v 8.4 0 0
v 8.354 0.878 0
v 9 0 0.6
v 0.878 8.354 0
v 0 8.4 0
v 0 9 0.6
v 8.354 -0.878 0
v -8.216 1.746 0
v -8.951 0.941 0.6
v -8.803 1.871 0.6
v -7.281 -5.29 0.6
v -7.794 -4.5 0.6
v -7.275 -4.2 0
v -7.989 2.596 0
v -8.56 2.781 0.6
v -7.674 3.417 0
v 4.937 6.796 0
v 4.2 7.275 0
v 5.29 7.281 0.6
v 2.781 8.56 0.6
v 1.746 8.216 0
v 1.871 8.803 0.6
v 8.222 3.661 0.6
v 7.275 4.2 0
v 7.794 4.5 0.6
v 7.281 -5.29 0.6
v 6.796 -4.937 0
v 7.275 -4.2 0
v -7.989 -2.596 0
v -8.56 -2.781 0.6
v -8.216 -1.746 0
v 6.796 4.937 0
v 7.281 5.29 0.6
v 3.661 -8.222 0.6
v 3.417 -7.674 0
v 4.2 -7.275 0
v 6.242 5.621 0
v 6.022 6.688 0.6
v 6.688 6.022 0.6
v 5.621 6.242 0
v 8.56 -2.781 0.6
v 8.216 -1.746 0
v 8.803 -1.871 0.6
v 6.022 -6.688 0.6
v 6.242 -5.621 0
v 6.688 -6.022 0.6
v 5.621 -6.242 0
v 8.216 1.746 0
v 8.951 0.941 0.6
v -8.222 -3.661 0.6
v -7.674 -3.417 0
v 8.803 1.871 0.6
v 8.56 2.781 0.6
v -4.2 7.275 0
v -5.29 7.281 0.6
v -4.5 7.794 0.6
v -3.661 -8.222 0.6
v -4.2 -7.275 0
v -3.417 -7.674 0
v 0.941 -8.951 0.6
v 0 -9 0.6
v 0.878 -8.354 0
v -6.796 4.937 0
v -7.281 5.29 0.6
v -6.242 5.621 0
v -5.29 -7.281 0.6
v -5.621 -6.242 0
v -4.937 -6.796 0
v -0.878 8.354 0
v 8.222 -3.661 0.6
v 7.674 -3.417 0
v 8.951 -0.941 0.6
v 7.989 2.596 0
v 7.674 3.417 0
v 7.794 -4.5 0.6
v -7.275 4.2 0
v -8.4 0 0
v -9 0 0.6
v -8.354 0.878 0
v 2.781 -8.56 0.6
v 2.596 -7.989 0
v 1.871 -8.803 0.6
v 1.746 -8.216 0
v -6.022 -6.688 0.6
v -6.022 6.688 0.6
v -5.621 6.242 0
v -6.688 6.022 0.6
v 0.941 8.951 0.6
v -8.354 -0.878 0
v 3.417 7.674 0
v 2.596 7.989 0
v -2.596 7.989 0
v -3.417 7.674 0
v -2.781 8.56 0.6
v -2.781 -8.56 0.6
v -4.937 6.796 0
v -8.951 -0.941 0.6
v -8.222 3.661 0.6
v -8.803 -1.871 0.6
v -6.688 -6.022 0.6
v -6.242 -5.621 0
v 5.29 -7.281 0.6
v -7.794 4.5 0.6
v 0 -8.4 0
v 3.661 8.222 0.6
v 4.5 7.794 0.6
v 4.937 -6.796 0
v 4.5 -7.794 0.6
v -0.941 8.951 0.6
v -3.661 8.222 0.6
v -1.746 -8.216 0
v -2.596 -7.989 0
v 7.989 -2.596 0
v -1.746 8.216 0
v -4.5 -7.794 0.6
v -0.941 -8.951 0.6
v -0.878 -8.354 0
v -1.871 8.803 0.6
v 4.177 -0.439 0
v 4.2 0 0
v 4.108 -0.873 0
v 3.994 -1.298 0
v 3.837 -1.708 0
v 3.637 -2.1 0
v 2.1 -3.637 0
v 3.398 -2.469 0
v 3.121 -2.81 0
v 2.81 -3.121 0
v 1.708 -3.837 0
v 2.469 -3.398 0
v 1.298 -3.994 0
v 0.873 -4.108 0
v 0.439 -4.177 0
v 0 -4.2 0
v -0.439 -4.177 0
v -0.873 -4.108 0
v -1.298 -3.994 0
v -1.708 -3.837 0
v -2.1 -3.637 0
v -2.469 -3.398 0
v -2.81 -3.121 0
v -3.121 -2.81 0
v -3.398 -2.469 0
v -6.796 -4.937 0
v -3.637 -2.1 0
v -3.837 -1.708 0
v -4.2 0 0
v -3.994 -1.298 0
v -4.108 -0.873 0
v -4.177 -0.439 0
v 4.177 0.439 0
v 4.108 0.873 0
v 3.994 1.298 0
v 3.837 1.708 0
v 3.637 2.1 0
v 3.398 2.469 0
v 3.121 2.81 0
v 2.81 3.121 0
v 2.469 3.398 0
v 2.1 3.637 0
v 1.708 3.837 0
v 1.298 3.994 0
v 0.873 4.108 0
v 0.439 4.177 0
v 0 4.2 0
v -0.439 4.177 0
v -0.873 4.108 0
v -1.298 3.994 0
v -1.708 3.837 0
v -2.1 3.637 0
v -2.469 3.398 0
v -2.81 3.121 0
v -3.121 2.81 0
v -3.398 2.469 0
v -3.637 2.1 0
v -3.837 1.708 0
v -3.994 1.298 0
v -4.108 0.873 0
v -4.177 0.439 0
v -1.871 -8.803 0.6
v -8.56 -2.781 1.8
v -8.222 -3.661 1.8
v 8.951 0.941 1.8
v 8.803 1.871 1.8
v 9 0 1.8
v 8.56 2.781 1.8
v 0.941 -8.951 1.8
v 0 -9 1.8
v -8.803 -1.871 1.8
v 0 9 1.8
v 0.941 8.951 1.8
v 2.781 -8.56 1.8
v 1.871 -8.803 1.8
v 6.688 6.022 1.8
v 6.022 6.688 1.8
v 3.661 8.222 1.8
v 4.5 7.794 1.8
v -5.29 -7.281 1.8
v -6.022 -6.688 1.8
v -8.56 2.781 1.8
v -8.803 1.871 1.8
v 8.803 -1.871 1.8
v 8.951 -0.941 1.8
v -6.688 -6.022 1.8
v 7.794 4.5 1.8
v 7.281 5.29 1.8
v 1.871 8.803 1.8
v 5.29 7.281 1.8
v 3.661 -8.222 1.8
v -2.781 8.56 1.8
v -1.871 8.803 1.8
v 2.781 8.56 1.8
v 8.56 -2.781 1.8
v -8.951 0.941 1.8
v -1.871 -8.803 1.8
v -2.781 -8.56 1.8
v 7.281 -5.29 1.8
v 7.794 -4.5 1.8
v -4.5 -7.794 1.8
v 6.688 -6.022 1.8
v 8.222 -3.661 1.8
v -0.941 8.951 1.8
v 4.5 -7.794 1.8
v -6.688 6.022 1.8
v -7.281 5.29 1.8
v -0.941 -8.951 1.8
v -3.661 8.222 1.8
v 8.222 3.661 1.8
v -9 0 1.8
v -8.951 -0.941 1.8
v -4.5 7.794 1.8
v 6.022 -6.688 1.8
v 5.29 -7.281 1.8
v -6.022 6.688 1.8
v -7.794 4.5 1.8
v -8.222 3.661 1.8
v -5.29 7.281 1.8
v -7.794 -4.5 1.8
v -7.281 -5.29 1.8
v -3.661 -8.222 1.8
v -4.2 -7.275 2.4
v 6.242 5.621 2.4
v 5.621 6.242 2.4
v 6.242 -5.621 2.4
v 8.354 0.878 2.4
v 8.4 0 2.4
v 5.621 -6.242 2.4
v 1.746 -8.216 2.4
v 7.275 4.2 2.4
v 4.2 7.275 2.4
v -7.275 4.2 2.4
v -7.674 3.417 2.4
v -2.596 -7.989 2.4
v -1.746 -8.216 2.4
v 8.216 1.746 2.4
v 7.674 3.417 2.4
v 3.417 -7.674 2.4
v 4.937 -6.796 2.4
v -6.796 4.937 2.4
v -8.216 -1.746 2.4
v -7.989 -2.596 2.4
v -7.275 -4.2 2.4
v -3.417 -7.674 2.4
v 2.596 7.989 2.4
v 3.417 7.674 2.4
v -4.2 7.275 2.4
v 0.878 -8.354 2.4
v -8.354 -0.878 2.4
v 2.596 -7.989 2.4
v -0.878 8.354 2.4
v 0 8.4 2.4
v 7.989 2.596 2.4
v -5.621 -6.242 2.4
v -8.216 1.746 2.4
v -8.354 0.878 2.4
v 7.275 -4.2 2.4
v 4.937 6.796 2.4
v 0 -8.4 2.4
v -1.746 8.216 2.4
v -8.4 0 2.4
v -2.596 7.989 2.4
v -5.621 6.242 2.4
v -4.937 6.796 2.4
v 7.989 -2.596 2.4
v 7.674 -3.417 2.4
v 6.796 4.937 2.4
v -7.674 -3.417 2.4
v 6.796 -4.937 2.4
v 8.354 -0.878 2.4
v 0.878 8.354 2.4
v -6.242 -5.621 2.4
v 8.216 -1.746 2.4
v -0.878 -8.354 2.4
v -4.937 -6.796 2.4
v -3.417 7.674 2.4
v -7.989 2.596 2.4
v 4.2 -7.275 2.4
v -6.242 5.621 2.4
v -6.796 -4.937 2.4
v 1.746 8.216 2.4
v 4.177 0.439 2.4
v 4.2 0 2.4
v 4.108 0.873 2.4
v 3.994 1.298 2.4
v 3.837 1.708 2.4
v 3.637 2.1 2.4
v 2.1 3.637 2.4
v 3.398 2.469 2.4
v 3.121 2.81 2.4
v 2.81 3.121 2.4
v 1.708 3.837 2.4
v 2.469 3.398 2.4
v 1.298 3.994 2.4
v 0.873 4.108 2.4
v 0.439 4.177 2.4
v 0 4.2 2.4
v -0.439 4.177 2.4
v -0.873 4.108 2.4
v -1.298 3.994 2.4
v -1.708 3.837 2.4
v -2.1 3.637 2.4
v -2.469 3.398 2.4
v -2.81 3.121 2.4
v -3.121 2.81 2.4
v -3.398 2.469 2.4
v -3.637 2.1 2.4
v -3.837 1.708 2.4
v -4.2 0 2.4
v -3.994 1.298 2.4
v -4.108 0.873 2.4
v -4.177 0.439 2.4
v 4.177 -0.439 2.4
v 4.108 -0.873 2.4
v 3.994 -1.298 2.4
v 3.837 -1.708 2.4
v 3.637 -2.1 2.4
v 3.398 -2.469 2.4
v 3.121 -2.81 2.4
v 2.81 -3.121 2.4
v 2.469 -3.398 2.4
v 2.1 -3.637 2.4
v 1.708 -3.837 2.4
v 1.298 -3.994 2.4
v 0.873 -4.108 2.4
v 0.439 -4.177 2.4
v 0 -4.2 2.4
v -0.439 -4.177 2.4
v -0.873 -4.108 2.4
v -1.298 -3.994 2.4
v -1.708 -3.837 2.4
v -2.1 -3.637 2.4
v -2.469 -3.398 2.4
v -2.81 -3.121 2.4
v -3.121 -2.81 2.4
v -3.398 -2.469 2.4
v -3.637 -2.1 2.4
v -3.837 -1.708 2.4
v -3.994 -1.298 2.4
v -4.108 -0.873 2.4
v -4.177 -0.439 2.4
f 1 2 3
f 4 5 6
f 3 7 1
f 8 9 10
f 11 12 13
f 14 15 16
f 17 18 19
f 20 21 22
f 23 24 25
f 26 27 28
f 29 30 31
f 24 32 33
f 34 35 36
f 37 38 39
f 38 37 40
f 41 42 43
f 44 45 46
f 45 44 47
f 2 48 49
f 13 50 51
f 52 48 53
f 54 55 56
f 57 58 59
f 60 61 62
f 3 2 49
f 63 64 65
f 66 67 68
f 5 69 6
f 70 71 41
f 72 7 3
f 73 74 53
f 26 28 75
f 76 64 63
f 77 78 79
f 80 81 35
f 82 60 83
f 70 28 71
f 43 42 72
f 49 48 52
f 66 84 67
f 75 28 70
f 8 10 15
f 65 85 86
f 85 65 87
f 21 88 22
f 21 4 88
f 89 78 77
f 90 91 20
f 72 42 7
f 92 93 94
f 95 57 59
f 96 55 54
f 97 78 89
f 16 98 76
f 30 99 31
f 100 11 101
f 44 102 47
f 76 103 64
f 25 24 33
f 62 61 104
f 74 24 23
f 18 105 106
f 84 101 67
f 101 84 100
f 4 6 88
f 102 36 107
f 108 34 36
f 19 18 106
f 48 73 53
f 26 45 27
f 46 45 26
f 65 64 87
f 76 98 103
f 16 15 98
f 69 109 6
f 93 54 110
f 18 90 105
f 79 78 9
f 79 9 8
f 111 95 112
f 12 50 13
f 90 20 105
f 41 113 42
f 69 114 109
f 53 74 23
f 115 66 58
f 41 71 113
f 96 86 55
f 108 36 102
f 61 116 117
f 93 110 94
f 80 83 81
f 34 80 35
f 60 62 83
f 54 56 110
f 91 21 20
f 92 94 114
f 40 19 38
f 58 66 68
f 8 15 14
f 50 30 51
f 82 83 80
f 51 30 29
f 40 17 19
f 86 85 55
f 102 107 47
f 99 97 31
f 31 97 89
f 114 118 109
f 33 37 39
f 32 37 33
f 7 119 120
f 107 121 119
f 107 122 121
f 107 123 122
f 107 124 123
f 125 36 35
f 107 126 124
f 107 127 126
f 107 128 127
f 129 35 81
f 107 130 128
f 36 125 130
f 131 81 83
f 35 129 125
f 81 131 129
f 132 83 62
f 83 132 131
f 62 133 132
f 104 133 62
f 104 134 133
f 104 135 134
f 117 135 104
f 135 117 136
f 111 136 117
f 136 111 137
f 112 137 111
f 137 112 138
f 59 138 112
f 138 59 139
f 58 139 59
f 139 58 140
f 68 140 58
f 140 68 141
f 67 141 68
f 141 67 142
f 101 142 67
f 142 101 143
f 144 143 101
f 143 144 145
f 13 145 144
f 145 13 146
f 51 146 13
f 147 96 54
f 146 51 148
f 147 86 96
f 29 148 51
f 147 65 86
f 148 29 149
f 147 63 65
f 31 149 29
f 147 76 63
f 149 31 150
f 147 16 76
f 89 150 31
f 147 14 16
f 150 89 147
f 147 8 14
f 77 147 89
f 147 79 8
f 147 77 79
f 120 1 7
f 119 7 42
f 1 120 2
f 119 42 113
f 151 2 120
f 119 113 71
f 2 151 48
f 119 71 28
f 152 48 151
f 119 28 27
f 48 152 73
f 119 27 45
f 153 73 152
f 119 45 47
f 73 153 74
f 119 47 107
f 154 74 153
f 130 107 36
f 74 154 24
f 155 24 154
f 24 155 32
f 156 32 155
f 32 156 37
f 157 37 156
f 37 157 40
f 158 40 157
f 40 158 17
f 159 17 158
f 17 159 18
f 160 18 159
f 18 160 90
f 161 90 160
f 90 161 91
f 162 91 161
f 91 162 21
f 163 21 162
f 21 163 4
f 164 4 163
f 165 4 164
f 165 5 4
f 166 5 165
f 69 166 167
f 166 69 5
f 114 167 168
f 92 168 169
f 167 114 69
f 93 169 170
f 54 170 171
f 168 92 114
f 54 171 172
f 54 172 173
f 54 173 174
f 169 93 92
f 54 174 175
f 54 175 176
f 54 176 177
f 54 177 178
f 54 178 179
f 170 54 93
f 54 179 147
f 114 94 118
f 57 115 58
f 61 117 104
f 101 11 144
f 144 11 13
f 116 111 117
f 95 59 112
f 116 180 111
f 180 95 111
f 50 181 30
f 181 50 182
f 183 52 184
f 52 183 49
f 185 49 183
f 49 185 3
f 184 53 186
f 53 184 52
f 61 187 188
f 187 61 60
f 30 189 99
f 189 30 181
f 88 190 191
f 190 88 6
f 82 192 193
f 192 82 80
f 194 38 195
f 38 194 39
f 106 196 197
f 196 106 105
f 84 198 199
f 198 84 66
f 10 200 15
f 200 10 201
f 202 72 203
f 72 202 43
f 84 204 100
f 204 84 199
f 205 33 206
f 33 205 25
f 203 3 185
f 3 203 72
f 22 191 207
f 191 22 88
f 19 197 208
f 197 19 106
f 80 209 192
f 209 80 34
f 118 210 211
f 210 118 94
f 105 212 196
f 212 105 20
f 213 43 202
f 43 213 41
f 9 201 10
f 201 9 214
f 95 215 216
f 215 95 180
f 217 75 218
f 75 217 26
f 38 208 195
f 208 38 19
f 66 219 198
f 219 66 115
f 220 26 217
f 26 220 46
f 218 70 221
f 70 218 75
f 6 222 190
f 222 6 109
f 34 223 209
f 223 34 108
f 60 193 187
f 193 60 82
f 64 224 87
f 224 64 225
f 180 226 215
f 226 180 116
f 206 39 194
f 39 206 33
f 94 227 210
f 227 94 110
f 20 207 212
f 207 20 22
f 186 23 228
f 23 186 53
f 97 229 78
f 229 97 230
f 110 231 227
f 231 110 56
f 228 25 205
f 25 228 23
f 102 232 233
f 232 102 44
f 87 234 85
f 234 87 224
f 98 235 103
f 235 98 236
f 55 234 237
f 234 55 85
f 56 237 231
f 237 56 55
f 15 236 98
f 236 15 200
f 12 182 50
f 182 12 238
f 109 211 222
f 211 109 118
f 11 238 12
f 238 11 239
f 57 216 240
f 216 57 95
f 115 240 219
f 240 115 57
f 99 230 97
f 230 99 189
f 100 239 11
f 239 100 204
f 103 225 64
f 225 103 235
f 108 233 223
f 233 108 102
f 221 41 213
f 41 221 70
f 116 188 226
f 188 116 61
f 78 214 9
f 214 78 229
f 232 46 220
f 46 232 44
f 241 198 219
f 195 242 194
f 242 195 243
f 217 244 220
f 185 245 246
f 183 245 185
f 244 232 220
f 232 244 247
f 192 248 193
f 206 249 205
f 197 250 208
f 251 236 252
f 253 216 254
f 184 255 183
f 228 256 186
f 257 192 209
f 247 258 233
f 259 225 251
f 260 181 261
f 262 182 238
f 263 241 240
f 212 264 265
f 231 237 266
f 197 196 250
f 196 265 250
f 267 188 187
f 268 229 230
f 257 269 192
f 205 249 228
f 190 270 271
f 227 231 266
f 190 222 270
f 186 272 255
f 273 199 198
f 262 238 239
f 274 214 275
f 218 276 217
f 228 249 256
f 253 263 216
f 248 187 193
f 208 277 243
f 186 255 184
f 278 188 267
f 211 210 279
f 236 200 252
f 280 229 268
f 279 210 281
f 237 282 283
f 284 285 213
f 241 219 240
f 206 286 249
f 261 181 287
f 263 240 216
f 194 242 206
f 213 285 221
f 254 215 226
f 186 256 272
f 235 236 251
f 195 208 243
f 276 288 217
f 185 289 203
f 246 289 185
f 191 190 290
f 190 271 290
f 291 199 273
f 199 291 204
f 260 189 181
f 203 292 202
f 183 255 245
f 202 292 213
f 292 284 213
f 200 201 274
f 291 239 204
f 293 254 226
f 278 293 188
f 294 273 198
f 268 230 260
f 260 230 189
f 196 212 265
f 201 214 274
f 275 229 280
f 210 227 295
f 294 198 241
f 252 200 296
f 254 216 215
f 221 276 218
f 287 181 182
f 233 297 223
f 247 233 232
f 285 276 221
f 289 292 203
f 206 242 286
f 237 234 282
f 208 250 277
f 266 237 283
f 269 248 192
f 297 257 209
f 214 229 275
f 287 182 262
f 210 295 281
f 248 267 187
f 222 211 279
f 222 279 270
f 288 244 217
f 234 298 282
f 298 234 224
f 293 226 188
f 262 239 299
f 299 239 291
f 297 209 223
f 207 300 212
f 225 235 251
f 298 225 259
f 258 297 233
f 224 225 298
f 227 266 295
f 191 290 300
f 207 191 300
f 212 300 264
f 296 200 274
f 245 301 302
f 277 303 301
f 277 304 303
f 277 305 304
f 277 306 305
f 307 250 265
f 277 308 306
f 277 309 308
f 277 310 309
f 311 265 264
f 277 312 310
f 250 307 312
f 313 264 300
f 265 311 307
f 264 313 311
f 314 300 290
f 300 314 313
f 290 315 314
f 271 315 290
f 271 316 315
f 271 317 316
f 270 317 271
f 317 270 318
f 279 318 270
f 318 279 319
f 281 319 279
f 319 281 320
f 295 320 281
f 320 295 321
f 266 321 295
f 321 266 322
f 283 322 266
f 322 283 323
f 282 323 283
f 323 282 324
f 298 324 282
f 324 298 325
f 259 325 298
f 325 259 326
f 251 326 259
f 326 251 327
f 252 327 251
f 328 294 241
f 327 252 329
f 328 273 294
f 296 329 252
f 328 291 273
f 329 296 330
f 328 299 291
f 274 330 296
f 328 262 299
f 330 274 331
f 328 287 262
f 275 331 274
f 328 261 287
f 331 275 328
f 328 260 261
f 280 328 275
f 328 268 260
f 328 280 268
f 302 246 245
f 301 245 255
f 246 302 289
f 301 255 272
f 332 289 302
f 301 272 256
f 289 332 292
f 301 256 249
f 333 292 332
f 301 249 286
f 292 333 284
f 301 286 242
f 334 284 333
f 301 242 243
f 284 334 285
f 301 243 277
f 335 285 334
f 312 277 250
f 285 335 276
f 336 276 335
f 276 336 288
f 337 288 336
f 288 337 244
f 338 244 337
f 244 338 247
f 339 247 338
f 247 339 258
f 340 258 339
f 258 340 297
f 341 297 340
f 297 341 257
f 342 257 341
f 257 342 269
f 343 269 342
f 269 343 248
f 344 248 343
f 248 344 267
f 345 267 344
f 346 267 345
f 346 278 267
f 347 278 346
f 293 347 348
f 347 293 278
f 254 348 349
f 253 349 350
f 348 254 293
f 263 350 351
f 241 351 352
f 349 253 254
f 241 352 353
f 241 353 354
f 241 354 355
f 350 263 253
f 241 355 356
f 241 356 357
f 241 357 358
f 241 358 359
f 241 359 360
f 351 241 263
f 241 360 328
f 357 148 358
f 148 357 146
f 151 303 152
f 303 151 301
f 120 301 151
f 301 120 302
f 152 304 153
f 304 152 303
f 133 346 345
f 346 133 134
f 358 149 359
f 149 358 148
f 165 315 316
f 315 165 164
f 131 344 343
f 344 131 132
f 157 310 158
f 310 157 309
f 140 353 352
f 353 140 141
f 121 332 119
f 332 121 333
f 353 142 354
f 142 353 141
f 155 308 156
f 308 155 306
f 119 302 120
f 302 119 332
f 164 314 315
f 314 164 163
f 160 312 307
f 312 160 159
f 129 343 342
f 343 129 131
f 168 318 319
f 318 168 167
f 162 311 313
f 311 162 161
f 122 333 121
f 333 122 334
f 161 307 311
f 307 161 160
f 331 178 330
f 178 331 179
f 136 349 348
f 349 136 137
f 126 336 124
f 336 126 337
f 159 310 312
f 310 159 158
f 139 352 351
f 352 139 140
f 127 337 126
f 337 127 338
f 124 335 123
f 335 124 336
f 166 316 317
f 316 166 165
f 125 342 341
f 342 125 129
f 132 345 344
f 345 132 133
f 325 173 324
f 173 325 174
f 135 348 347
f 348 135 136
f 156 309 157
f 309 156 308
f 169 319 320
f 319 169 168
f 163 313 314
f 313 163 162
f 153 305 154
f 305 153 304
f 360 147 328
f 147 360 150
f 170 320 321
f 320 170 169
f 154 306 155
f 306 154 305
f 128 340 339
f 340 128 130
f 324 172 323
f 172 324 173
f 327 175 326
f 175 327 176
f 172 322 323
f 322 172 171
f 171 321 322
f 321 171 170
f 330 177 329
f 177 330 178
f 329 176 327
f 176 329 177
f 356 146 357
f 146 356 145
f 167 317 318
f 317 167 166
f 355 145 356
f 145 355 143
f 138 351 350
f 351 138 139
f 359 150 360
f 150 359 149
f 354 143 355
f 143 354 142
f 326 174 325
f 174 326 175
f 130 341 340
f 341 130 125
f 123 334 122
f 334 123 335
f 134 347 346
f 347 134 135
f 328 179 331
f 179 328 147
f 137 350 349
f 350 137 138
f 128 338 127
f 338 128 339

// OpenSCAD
// Chamfered metric washer.
$fn = 60;
eps = 0.02;
inner_d = 8.4;
outer_d = 18;
thickness = 2.4;
chamfer = 0.6;
difference() {
    union() {
        cylinder(d1 = outer_d - 2 * chamfer, d2 = outer_d, h = chamfer);
        translate([0, 0, chamfer]) cylinder(d = outer_d, h = thickness - 2 * chamfer);
        translate([0, 0, thickness - chamfer]) cylinder(d1 = outer_d, d2 = outer_d - 2 * chamfer, h = chamfer);
    }
    translate([0, 0, -eps]) cylinder(d = inner_d, h = thickness + 2 * eps);
}
